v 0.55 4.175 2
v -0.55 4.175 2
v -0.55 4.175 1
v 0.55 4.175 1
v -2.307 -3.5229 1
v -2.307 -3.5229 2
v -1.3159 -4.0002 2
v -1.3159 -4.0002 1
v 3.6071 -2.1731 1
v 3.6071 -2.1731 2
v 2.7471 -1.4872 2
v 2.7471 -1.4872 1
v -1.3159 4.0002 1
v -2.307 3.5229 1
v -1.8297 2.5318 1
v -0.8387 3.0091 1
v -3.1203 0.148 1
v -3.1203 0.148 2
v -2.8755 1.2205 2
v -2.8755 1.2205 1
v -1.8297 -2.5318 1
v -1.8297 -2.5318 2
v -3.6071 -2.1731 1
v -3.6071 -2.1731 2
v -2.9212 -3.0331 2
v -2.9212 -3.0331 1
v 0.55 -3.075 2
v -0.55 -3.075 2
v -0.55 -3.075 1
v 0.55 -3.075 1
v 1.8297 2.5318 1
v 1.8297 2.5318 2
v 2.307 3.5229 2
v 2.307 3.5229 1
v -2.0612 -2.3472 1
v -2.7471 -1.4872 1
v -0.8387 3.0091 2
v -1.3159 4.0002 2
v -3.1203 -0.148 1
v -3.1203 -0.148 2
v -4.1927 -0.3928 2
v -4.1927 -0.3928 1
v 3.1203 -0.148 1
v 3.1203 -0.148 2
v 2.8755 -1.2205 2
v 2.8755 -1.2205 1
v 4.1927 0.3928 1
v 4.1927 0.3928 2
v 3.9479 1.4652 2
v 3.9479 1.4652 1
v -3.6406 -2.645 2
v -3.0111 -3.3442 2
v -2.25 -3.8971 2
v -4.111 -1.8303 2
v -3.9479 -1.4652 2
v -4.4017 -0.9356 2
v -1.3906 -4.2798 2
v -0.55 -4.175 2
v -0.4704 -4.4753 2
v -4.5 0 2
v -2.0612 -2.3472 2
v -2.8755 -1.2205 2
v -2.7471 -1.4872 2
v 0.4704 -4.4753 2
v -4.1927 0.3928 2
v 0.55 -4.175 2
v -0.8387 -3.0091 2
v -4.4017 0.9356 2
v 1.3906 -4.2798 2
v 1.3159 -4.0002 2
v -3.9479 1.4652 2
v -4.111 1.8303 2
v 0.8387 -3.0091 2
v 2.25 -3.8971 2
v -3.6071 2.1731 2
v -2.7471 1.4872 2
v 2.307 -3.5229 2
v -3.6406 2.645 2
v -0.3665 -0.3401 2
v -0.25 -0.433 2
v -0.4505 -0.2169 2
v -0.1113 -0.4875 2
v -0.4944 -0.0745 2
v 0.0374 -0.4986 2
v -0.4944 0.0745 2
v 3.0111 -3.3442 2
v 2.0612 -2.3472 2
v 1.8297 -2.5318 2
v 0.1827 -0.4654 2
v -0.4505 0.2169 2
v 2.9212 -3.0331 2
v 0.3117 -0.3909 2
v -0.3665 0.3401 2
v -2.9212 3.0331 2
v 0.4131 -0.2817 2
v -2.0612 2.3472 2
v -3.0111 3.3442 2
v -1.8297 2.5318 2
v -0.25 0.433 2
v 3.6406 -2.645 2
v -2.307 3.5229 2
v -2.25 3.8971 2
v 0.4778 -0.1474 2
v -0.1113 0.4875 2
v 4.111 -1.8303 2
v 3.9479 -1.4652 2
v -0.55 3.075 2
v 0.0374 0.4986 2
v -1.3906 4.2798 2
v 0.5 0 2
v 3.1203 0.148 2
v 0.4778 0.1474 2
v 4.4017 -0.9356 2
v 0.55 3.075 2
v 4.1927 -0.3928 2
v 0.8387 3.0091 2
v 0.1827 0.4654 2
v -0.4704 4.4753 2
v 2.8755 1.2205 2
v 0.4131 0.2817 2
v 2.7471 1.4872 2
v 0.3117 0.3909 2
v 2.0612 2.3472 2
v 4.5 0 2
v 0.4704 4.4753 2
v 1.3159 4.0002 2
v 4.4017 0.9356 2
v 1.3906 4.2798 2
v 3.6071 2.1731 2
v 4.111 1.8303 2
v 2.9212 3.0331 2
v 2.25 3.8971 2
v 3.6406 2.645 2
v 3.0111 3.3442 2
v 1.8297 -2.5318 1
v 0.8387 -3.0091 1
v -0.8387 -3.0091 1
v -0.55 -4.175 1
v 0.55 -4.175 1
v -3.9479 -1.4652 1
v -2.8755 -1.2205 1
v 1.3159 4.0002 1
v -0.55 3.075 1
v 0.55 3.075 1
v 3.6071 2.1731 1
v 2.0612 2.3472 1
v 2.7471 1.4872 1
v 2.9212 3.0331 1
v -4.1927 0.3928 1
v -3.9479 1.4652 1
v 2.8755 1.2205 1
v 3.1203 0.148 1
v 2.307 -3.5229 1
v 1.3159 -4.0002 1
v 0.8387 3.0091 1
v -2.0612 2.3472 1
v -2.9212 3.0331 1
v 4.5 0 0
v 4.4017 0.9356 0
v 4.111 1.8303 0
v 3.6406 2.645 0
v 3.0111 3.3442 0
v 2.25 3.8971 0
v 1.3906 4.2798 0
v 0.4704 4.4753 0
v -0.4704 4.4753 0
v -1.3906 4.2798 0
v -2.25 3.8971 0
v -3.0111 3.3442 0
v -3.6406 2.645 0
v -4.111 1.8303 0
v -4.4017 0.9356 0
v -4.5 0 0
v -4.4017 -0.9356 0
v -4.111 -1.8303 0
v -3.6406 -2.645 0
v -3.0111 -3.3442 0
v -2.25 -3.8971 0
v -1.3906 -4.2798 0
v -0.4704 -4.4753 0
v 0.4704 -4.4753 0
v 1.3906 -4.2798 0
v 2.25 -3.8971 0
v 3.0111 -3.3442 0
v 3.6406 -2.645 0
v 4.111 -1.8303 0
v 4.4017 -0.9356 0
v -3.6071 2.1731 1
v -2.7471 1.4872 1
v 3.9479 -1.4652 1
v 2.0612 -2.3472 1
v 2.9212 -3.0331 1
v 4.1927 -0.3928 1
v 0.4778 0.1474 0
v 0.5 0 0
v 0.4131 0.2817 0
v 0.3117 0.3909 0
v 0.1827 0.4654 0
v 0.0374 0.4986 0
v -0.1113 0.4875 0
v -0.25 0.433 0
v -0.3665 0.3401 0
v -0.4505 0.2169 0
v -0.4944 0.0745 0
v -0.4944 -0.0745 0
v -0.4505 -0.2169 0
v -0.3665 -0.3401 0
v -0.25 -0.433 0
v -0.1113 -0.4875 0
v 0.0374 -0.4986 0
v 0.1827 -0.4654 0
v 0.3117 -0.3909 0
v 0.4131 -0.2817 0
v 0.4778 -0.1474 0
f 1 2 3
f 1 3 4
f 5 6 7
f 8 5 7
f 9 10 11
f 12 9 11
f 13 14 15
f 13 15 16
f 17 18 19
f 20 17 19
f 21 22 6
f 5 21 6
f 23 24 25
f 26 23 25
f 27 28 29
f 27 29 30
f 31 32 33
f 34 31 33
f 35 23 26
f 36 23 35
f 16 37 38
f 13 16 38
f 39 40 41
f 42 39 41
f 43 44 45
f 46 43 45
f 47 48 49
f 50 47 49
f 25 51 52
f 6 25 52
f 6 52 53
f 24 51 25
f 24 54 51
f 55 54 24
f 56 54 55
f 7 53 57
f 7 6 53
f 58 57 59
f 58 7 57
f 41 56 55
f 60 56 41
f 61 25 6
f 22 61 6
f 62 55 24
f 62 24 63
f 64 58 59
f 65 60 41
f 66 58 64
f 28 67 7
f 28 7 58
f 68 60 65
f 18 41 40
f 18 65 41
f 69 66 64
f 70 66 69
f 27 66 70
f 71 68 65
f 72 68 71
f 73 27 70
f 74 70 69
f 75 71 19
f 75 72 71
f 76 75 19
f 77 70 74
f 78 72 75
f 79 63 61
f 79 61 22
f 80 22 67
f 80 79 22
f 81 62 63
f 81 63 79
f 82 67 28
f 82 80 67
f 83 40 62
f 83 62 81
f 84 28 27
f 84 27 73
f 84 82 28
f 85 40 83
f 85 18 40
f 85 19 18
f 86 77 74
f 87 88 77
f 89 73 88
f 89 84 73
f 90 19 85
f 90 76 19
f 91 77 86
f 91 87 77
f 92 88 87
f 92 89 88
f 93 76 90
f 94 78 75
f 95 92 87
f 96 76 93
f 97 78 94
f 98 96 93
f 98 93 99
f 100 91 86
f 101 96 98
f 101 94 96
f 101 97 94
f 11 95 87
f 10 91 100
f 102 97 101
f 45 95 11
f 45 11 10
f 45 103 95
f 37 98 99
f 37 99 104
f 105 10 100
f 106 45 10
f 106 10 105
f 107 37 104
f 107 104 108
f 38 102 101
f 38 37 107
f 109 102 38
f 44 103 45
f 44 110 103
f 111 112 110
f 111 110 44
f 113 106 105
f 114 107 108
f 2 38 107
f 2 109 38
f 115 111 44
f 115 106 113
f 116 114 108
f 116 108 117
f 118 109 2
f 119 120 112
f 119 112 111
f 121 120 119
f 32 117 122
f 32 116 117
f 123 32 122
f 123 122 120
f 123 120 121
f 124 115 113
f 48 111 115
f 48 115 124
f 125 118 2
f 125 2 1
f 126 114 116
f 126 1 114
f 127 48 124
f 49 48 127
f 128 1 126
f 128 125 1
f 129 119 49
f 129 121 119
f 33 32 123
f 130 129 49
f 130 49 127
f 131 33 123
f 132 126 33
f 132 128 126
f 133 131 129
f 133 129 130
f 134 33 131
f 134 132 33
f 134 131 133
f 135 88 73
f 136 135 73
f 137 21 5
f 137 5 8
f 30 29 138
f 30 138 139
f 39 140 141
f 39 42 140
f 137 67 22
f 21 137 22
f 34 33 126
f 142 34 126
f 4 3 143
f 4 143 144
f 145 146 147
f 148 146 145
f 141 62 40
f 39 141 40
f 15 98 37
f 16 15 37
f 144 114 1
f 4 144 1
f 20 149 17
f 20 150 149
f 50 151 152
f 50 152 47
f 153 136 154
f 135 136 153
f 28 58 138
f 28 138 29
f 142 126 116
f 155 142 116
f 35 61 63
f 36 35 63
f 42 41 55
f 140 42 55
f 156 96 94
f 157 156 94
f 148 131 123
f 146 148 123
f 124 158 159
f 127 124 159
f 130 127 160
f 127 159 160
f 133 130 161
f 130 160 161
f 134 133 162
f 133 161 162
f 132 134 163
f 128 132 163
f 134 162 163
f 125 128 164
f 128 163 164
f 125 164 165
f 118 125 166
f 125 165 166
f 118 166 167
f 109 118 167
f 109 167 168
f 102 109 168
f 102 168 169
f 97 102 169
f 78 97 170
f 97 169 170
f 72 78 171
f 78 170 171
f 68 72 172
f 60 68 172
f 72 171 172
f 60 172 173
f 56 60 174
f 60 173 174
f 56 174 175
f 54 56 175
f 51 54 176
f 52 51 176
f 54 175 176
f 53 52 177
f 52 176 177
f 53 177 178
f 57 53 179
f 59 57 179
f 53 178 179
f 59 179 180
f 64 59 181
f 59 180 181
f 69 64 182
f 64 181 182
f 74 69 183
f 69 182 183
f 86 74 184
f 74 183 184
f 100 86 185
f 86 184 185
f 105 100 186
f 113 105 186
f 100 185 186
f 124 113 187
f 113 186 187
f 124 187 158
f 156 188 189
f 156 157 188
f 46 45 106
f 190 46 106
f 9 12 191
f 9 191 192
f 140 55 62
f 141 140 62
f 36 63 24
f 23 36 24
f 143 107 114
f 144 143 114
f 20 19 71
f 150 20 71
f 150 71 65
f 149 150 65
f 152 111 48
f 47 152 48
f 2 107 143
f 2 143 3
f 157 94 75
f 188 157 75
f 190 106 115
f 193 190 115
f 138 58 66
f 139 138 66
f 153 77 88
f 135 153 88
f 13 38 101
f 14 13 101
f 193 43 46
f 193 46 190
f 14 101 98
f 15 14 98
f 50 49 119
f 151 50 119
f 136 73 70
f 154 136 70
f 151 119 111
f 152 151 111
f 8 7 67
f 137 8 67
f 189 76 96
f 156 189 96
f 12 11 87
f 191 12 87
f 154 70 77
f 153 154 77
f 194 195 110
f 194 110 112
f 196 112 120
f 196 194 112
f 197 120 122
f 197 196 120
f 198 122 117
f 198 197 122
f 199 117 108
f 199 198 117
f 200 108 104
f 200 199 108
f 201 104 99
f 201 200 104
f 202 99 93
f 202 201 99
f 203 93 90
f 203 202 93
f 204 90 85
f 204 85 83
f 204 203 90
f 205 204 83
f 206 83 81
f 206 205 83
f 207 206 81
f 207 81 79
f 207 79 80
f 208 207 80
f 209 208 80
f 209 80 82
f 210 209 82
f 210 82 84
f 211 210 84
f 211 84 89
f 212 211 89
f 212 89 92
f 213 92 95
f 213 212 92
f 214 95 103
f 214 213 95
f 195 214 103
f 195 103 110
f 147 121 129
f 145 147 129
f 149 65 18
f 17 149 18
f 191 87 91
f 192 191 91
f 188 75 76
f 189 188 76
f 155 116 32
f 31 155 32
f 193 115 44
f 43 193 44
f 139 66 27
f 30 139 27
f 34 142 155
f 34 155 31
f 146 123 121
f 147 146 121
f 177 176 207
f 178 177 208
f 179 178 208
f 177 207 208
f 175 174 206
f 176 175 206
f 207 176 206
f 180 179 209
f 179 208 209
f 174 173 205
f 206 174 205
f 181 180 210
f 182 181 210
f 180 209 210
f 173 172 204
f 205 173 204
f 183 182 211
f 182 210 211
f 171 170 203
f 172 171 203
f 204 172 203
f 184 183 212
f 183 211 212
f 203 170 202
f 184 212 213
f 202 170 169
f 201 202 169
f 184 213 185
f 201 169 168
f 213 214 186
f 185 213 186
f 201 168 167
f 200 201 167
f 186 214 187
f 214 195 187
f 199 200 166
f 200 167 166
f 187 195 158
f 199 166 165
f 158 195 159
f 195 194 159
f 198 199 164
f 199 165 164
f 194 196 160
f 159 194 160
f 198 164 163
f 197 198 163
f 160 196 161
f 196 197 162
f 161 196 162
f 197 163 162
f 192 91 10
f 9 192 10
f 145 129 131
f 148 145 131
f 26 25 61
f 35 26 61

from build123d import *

# Parameters (mm, degrees)
SZKIC1_R                    = 4.5
SZKIC1_R_2                  = 0.5
DODANIE_WYCI_GNI_CIE1_DEPTH = 2
SZKIC2_W                    = 1.1
SZKIC2_H                    = 1.1
WYTNIJ_WYCI_GNI_CIE1_DEPTH  = 1


with BuildPart() as part:
    # Szkic1 → Dodanie-wyciągnięcie1 (new body)
    with BuildSketch(Plane.XY):
        Circle(SZKIC1_R)
        Circle(SZKIC1_R_2, mode=Mode.SUBTRACT)
    extrude(amount=DODANIE_WYCI_GNI_CIE1_DEPTH)

    # Szkic2 → Wytnij-wyciągnięcie1 (cut)
    with BuildSketch(Plane.XY.offset(2)):
        Polygon((1.315931733, 4.00018108), (0.83865962, 3.009115325), (1.829725375, 2.531843212), (2.306997488, 3.522908967), align=None)
        with Locations((0, 3.625)):
            Rectangle(SZKIC2_W, SZKIC2_H)
        Polygon((2.921227048, 3.033077238), (2.061212418, 2.347238456), (2.7470512, 1.487223825), (3.60706583, 2.173062607), align=None)
        Polygon((3.94793752, 1.465235251), (2.875516816, 1.220462224), (3.120289844, 0.14804152), (4.192710547, 0.392814548), align=None)
        Polygon((4.192710547, -0.392814548), (3.120289844, -0.14804152), (2.875516816, -1.220462224), (3.94793752, -1.465235251), align=None)
        Polygon((3.60706583, -2.173062607), (2.7470512, -1.487223825), (2.061212418, -2.347238456), (2.921227048, -3.033077238), align=None)
        Polygon((2.306997488, -3.522908967), (1.829725375, -2.531843212), (0.83865962, -3.009115325), (1.315931733, -4.00018108), align=None)
        with Locations((0, -3.625)):
            Rectangle(SZKIC2_W, SZKIC2_H)
        Polygon((-1.315931733, -4.00018108), (-0.83865962, -3.009115325), (-1.829725375, -2.531843212), (-2.306997488, -3.522908967), align=None)
        Polygon((-2.921227048, -3.033077238), (-2.061212418, -2.347238456), (-2.7470512, -1.487223825), (-3.60706583, -2.173062607), align=None)
        Polygon((-3.94793752, -1.465235251), (-2.875516816, -1.220462224), (-3.120289844, -0.14804152), (-4.192710547, -0.392814548), align=None)
        Polygon((-4.192710547, 0.392814548), (-3.120289844, 0.14804152), (-2.875516816, 1.220462224), (-3.94793752, 1.465235251), align=None)
        Polygon((-3.60706583, 2.173062607), (-2.7470512, 1.487223825), (-2.061212418, 2.347238456), (-2.921227048, 3.033077238), align=None)
        Polygon((-2.306997488, 3.522908967), (-1.829725375, 2.531843212), (-0.83865962, 3.009115325), (-1.315931733, 4.00018108), align=None)
    extrude(amount=-WYTNIJ_WYCI_GNI_CIE1_DEPTH, mode=Mode.SUBTRACT)


solid = part.part
